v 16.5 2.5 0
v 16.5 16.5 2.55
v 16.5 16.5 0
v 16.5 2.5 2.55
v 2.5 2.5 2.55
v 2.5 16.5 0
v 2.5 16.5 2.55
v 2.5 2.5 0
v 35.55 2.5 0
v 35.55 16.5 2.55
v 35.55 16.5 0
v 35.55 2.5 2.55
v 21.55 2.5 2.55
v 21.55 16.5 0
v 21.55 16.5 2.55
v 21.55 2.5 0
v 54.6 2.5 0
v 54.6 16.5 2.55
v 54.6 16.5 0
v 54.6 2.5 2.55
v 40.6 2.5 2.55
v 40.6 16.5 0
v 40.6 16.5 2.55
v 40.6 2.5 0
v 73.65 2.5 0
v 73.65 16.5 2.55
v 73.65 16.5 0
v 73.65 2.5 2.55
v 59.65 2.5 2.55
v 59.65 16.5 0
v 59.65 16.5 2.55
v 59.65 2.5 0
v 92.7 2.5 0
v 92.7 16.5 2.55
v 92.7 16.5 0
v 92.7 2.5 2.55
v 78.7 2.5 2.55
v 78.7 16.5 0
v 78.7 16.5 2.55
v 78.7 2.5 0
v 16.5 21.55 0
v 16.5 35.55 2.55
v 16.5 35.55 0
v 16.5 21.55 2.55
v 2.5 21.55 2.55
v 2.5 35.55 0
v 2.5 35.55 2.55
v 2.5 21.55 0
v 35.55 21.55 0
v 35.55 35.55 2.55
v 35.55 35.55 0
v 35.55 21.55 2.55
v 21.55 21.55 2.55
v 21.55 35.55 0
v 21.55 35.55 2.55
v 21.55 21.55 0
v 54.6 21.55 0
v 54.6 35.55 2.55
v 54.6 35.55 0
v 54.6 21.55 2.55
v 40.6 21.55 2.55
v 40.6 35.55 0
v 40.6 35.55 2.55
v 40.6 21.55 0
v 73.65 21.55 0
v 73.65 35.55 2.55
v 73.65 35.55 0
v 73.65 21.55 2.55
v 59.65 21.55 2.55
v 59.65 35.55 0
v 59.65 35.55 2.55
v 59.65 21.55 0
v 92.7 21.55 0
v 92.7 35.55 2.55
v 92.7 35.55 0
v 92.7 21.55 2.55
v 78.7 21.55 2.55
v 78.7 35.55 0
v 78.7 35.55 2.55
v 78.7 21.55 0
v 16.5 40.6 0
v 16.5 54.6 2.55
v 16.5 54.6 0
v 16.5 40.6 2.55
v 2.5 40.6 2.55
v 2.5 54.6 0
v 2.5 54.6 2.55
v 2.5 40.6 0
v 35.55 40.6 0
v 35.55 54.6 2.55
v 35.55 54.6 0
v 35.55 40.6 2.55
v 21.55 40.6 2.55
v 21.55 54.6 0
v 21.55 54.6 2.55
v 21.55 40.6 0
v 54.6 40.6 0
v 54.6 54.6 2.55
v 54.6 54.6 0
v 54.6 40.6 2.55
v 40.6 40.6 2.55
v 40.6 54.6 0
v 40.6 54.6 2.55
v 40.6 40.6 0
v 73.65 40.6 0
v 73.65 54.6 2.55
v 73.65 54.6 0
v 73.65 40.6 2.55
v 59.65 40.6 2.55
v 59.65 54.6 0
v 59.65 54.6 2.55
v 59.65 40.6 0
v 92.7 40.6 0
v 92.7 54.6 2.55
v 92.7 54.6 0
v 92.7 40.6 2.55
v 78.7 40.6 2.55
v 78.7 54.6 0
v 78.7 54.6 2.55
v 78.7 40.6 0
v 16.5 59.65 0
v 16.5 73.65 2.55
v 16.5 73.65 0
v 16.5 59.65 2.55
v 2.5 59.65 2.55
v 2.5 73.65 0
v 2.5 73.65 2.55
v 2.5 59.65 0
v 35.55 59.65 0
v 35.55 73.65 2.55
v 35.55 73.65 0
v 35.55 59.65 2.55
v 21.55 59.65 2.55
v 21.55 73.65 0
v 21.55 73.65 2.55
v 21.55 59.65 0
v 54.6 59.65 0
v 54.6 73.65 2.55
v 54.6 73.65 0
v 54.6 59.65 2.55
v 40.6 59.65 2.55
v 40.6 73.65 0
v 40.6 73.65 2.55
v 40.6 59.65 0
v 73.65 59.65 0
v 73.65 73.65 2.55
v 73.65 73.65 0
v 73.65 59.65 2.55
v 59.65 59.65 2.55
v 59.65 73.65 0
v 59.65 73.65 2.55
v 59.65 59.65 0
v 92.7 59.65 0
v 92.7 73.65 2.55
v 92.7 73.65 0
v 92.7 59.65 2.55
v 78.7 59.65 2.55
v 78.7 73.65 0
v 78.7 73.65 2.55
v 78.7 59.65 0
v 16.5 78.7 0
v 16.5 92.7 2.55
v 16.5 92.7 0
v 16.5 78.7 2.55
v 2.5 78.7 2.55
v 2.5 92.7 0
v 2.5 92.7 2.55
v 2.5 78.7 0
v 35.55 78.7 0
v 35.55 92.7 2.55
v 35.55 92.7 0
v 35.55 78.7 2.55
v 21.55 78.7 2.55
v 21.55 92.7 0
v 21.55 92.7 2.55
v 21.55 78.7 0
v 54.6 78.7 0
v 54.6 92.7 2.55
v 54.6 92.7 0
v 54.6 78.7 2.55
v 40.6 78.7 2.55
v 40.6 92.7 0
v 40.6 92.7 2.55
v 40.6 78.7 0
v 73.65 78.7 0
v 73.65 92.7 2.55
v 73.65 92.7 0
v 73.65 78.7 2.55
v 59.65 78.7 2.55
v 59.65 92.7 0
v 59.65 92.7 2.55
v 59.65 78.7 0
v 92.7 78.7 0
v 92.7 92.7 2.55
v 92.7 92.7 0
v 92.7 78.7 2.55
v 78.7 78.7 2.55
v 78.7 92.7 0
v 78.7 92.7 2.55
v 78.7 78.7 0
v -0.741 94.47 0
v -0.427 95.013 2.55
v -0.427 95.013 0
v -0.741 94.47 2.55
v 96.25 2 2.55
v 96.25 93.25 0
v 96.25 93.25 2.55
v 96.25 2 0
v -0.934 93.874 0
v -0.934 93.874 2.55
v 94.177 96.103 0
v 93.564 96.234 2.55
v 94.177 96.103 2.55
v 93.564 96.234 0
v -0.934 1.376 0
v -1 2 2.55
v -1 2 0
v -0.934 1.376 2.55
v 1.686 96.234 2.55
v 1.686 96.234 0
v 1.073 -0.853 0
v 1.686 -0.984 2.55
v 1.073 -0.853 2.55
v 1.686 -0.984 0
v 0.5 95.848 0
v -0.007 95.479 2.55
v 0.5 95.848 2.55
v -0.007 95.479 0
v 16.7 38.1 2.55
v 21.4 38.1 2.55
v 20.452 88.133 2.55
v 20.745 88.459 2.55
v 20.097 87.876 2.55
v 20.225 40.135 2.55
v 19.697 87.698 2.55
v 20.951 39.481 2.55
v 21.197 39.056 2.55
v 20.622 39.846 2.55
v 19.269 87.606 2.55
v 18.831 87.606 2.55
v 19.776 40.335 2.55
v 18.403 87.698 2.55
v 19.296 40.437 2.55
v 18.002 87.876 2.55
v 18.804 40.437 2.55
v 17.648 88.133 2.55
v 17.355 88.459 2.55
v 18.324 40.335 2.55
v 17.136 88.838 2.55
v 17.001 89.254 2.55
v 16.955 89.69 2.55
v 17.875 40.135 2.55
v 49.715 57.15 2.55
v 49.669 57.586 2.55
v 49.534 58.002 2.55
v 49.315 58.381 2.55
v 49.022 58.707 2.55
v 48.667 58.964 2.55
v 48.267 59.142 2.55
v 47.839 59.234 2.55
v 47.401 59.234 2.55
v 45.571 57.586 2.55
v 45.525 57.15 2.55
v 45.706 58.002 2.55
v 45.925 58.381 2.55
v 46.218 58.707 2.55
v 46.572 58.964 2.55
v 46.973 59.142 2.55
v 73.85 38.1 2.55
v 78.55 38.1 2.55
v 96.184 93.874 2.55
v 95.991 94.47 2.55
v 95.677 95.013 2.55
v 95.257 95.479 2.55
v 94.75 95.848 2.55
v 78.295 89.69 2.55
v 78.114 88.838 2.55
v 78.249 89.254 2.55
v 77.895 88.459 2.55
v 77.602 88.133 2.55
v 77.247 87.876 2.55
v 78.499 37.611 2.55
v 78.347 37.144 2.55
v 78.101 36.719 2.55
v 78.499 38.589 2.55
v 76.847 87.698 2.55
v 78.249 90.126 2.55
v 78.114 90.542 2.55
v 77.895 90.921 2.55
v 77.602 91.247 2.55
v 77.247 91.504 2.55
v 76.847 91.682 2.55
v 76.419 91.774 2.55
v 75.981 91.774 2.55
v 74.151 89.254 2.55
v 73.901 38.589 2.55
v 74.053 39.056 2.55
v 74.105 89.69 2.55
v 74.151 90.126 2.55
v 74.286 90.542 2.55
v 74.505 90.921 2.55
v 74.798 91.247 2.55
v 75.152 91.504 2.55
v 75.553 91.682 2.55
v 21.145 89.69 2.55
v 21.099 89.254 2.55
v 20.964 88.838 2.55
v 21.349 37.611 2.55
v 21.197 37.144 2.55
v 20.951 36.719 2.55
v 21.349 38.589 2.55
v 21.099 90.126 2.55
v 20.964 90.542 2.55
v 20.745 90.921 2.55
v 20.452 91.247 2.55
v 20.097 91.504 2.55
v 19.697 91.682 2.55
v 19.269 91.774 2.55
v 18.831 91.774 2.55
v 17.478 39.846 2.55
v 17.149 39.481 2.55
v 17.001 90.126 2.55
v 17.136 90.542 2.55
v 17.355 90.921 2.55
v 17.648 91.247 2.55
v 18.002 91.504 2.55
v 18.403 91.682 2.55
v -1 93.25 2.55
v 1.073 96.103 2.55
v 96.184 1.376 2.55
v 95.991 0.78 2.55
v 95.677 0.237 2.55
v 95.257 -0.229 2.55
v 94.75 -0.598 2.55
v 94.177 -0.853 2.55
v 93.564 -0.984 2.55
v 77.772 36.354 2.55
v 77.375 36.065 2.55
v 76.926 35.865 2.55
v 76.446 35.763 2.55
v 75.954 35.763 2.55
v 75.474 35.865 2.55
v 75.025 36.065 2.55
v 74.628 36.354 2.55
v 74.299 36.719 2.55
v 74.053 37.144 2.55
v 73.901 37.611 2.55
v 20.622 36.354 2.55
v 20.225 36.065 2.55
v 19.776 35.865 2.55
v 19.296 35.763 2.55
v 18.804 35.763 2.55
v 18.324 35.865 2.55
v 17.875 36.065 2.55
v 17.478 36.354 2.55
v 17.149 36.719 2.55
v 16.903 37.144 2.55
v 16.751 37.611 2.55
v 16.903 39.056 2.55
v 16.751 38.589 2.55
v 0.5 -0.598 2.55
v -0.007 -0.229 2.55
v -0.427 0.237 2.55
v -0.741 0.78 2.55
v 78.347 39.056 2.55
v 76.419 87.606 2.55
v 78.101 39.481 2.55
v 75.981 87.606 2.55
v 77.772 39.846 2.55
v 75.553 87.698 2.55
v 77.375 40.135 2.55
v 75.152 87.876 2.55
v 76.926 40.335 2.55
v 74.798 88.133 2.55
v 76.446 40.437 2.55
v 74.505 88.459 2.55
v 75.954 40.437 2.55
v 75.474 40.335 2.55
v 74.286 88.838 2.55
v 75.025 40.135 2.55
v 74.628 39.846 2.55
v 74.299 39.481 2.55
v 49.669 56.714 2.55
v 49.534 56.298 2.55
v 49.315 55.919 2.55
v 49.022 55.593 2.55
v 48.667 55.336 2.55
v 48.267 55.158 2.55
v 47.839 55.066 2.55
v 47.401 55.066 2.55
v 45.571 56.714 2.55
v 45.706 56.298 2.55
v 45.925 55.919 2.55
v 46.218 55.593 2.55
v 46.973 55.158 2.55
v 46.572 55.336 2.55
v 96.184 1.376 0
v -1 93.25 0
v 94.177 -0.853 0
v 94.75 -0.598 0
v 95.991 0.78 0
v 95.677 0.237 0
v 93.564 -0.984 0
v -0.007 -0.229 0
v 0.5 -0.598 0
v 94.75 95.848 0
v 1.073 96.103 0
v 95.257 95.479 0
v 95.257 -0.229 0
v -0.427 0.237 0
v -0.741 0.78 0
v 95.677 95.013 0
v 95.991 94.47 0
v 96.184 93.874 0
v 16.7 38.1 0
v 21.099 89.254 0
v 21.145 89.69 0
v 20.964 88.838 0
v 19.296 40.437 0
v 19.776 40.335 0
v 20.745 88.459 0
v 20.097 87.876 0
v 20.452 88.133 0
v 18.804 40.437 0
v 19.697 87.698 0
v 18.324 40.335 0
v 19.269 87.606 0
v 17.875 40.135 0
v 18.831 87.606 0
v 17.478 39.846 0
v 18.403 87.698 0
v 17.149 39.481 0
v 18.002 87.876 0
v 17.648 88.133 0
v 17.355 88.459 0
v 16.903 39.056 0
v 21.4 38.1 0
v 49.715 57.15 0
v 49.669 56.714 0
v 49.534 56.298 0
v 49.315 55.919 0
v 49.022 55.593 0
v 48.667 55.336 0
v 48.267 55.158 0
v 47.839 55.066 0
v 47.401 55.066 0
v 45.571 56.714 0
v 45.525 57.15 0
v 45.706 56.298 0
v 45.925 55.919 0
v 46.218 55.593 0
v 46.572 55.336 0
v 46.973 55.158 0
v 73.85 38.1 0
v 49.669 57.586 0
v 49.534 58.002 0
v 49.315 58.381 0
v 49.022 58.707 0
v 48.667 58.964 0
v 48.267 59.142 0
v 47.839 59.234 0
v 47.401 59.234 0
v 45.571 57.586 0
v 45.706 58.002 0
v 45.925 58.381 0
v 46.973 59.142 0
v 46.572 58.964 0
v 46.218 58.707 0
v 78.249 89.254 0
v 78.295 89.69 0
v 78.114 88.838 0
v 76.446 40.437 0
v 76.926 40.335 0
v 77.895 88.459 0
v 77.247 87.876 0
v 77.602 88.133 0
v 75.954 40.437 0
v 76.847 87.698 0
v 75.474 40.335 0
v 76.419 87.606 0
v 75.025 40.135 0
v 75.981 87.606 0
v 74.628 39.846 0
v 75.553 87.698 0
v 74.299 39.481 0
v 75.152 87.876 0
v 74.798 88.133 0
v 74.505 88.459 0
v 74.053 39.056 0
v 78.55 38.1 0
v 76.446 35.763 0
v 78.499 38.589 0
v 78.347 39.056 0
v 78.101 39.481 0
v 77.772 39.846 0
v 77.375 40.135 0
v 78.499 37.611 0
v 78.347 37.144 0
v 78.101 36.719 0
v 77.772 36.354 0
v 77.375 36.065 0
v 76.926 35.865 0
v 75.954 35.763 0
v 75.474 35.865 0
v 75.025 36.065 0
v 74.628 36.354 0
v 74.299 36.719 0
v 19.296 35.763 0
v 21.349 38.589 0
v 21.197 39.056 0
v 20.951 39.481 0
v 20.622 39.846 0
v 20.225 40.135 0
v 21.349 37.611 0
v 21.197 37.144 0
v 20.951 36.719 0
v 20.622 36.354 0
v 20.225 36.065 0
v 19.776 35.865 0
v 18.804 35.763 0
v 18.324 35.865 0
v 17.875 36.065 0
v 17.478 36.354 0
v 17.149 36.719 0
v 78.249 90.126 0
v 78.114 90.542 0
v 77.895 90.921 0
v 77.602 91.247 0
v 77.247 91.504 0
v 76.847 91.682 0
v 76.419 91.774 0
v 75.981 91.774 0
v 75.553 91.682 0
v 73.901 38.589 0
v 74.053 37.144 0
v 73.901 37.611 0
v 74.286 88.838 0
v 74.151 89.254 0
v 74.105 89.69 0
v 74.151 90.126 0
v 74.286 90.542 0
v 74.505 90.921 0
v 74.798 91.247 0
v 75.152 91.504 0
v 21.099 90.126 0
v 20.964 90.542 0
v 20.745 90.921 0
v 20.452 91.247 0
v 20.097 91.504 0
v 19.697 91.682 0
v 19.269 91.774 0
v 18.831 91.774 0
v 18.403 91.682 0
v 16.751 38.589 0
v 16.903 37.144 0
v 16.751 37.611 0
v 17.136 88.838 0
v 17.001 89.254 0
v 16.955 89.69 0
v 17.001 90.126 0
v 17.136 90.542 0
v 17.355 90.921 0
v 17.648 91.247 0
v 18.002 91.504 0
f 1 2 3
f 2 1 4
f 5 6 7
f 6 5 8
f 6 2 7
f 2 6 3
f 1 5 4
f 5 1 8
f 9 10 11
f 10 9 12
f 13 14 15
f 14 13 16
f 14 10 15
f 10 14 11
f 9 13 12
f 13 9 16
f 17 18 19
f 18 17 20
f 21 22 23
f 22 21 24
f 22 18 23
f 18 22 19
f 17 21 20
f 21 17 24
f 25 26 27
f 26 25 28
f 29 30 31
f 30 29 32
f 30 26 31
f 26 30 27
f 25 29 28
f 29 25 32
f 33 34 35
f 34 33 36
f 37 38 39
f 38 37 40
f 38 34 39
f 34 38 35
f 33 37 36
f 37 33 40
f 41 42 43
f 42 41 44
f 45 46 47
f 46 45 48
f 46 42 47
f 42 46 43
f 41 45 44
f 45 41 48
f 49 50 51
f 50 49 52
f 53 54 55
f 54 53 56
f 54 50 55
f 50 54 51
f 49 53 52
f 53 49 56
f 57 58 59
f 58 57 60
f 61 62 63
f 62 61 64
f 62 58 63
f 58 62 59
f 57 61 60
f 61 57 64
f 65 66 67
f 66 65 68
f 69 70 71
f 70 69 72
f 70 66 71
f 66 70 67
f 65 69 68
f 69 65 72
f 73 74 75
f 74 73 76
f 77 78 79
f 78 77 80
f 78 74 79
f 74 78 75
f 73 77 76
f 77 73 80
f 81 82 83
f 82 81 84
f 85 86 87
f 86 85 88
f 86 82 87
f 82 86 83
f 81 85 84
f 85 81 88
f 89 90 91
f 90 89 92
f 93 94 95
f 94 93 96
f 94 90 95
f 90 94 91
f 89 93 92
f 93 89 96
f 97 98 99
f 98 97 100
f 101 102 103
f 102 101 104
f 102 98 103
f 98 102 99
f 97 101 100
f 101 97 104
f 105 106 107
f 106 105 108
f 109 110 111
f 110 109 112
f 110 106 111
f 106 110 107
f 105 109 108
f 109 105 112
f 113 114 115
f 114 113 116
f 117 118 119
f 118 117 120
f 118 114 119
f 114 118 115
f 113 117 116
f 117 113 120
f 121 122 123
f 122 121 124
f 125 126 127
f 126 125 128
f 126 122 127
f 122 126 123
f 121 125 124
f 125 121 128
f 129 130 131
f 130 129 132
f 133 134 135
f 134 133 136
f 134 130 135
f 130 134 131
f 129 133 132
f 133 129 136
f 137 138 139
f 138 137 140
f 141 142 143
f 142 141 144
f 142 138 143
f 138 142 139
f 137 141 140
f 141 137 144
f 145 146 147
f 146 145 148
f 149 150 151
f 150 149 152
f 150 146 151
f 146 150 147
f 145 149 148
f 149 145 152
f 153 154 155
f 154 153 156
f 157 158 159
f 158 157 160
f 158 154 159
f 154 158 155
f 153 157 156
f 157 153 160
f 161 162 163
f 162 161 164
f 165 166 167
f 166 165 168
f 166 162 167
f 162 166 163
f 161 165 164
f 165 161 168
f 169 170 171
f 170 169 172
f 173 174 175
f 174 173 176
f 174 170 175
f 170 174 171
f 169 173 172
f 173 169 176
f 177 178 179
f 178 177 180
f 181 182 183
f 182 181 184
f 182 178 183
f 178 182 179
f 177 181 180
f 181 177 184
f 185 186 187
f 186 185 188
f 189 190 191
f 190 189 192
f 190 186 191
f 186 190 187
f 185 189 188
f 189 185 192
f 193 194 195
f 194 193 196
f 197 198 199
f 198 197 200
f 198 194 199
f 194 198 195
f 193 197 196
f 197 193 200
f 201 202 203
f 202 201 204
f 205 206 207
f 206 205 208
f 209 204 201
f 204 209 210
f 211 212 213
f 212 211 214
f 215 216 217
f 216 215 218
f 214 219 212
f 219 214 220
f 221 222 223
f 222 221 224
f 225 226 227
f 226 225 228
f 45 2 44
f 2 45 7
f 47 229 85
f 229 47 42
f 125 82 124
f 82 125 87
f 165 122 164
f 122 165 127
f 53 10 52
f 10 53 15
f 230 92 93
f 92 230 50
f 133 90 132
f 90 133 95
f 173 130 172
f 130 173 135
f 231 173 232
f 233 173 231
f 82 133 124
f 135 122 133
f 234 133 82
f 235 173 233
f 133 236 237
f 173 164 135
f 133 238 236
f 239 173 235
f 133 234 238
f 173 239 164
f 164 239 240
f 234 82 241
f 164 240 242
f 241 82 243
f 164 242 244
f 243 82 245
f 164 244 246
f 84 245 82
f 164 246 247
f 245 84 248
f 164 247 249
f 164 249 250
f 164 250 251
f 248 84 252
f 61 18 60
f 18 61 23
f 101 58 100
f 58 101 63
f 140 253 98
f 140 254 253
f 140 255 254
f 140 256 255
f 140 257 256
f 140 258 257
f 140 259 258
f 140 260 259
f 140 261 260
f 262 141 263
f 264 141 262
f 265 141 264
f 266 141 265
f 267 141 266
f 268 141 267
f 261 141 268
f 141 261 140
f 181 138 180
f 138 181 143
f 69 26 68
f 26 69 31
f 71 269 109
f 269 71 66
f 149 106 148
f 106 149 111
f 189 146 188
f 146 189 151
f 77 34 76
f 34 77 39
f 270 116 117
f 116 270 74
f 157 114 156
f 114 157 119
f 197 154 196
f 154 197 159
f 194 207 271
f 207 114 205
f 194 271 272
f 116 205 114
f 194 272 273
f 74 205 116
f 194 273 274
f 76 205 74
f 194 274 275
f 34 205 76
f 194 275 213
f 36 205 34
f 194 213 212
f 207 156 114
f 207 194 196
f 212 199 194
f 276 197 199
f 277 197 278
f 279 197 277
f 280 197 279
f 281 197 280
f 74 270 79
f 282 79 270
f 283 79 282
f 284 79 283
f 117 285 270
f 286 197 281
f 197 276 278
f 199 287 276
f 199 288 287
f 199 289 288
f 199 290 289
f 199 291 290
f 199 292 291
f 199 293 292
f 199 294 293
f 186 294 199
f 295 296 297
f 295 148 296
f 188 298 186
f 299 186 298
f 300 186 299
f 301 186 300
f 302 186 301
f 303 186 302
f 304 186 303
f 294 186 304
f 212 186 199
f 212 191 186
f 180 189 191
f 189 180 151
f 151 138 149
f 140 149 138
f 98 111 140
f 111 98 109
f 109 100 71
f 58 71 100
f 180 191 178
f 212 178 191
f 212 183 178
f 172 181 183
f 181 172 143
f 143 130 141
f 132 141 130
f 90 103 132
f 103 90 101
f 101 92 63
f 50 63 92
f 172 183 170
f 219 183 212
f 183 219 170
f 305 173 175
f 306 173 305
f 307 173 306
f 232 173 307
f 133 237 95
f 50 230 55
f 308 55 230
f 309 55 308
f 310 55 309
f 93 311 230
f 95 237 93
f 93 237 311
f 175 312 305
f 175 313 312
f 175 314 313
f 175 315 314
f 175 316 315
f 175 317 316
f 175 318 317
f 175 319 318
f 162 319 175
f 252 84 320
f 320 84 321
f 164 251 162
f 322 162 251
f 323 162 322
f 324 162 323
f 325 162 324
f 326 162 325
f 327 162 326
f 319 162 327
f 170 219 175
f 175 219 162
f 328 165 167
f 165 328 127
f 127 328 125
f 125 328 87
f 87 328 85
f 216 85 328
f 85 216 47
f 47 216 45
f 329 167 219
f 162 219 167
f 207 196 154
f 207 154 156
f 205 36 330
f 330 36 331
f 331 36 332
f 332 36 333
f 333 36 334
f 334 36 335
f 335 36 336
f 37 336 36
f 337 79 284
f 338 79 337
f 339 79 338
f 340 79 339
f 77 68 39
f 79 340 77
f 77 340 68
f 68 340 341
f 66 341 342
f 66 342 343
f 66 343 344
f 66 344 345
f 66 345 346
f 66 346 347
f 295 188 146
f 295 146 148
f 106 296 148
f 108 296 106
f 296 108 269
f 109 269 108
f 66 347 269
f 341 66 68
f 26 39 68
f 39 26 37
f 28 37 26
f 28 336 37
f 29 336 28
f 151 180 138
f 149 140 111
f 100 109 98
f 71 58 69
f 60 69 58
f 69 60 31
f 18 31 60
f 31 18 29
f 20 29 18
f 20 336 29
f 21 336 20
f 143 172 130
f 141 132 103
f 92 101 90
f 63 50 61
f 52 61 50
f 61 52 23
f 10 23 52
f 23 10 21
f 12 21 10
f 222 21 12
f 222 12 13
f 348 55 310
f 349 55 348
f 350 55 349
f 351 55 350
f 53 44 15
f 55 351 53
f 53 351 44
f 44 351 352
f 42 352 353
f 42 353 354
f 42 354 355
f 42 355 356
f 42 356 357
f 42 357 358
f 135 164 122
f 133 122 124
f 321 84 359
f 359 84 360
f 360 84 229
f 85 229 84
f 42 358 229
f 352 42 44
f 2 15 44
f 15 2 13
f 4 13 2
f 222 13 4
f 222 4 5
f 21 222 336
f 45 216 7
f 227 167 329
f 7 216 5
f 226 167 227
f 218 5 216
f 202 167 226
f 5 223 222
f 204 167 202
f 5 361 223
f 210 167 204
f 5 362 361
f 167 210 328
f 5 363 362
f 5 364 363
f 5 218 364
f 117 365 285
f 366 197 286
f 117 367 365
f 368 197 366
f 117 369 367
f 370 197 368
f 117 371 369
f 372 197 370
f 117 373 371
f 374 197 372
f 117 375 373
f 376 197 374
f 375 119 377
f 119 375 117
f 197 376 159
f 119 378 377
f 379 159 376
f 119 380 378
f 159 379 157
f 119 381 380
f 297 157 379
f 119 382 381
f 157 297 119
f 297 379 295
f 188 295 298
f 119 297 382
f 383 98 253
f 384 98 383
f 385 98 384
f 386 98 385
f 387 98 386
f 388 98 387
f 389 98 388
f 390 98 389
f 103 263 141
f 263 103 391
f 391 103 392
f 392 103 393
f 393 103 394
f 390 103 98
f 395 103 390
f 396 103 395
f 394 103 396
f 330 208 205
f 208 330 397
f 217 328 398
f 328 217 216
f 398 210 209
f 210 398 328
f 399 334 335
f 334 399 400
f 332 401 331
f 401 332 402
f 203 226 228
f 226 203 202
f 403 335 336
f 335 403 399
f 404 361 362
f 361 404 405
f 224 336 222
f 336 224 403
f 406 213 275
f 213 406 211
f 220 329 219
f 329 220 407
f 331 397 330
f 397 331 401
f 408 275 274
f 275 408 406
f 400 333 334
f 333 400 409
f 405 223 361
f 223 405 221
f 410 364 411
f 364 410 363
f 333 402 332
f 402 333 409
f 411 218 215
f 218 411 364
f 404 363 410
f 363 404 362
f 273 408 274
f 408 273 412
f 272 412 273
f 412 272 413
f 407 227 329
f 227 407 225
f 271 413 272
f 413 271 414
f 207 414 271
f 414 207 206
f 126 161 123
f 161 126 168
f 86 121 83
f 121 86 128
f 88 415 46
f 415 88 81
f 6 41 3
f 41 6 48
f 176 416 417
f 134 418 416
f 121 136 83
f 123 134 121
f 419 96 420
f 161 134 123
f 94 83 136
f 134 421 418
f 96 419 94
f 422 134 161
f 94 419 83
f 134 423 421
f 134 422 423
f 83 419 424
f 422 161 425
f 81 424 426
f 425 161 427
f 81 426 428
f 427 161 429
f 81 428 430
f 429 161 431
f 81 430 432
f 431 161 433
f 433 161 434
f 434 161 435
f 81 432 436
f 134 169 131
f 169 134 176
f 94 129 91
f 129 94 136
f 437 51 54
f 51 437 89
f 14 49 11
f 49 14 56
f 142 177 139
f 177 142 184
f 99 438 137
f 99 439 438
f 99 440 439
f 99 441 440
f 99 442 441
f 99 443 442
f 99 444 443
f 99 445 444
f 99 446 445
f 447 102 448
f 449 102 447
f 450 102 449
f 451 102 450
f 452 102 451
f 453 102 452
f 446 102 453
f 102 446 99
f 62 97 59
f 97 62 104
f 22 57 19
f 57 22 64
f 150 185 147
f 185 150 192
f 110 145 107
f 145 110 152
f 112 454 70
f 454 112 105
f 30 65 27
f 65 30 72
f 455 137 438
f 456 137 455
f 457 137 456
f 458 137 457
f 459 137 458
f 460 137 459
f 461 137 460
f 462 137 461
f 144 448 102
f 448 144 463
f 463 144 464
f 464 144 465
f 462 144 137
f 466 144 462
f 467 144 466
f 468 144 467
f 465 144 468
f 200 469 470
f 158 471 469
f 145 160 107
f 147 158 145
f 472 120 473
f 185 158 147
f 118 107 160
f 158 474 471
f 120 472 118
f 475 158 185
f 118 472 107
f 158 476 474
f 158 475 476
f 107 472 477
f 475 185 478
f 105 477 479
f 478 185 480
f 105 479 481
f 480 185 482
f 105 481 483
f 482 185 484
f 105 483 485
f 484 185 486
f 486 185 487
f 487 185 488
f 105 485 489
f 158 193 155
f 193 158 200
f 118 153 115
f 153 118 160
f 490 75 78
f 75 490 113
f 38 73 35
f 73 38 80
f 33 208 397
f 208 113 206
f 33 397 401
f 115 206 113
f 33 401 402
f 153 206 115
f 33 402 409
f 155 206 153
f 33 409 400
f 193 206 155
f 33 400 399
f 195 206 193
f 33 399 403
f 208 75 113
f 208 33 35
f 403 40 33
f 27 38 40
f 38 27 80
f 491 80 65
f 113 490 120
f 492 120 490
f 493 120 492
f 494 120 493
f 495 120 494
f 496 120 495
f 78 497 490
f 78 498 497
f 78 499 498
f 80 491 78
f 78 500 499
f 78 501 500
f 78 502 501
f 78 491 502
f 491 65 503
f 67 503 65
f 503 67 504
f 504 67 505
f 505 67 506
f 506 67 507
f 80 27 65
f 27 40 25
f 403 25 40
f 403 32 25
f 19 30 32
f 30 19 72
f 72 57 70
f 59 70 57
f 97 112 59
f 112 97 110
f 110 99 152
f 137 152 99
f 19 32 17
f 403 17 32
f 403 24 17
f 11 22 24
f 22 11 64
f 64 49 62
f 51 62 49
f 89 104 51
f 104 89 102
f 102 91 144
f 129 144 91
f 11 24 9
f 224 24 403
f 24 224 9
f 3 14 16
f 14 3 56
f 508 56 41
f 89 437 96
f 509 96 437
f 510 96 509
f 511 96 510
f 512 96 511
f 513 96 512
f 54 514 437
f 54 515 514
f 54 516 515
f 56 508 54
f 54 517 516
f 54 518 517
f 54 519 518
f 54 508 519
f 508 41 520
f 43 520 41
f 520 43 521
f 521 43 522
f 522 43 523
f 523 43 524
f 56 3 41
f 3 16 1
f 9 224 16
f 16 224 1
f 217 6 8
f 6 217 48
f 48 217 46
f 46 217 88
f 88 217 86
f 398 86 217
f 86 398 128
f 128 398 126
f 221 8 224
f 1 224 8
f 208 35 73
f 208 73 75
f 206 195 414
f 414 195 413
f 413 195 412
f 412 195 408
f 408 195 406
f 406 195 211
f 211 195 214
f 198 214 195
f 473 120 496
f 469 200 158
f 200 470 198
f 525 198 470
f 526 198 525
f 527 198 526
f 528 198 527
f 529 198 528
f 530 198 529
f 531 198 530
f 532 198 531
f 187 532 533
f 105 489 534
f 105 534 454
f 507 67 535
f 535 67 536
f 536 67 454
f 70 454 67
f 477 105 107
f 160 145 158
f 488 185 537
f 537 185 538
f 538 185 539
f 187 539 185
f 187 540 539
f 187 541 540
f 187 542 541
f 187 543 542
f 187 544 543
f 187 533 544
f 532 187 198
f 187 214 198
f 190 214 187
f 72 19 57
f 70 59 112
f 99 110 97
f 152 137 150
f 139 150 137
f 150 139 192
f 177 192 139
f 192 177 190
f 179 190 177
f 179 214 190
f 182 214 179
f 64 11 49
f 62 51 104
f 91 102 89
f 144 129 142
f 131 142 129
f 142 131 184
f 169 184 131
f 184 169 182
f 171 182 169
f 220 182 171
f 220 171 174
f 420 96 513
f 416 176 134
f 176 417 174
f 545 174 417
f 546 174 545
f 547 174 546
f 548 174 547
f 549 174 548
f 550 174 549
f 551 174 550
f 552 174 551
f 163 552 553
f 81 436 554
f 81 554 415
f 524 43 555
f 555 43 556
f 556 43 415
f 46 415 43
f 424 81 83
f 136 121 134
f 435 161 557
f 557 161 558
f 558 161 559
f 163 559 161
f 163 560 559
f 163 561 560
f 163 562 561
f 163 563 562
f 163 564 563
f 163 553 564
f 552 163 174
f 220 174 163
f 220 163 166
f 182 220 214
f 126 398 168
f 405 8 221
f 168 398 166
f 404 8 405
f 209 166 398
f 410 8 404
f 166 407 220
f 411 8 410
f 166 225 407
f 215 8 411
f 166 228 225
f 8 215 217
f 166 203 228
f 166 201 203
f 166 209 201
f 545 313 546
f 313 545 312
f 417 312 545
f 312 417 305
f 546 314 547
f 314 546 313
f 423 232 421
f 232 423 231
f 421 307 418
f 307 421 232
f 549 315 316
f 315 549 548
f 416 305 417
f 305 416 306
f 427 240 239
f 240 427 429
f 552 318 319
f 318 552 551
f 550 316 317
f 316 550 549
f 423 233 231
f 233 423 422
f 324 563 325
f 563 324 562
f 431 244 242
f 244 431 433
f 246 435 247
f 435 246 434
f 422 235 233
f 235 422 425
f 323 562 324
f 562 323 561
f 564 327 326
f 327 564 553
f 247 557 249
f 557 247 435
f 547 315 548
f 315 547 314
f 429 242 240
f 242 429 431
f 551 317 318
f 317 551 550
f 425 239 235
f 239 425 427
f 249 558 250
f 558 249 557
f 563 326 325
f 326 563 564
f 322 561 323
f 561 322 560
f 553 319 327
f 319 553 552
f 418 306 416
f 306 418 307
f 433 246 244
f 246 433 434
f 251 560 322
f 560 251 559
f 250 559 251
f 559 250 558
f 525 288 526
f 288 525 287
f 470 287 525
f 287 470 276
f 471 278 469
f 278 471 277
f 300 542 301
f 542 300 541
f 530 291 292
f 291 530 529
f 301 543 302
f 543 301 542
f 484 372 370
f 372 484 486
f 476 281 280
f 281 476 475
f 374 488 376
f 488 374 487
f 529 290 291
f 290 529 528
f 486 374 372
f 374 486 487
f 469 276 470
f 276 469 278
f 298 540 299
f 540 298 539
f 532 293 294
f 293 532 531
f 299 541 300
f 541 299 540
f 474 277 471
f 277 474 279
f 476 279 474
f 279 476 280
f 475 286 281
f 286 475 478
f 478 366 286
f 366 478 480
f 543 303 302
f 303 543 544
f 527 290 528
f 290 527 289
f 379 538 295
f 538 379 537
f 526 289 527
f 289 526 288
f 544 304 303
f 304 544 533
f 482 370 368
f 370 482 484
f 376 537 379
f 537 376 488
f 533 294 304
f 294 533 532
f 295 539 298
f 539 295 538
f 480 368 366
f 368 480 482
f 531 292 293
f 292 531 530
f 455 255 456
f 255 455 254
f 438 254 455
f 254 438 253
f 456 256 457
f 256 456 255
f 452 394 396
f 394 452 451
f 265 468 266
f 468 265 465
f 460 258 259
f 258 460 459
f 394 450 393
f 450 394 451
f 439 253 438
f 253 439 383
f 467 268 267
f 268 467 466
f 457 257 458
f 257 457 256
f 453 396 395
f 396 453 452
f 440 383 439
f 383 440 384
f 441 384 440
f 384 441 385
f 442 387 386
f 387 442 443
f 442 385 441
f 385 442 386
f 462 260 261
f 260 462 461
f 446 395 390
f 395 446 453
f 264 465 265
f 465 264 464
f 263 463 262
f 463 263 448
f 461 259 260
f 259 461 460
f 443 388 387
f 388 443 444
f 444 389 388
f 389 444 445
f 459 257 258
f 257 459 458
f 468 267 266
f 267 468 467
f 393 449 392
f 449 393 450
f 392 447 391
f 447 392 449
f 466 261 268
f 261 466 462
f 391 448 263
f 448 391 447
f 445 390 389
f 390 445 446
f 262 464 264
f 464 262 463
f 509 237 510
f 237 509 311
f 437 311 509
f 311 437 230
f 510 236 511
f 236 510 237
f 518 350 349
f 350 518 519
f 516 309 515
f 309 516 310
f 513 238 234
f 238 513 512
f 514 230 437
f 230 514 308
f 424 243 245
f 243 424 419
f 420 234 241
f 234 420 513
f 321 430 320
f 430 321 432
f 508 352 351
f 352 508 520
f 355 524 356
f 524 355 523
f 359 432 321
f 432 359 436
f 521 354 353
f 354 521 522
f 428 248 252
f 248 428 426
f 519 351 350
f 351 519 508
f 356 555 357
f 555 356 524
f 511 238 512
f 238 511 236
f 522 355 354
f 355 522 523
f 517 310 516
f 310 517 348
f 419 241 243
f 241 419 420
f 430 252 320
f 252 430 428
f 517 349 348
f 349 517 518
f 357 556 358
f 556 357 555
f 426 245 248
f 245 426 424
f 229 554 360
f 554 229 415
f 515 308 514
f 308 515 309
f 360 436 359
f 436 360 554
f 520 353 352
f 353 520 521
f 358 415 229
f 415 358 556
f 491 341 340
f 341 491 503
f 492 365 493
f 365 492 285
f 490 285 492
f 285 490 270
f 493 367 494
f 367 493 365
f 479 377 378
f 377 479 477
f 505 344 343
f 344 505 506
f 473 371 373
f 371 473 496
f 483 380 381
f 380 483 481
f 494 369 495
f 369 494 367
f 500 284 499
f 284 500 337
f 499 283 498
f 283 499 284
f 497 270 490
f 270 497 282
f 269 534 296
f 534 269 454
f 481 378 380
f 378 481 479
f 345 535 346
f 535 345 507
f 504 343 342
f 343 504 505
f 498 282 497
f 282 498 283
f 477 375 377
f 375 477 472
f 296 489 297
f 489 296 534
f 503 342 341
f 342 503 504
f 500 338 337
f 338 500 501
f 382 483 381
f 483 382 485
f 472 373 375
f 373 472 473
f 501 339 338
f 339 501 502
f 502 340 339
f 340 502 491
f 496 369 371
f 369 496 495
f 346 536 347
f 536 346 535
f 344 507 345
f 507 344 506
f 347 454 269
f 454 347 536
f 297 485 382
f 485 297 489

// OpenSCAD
/* 1u Plate */
difference() {
    translate([2,2,0])
    color([0.5,0.5,0.5])  minkowski(){
        cube([91.25,91.25,2.5]);
        cylinder($fn=30,r=3, h=0.05);
    }
    
    /* Screw holes */
    /* Top */
    translate([19.05,89.69,0])
            ScrewHole();
    translate([76.20,89.69,0])
            ScrewHole();
    /* Center */
    translate([47.62,57.15,0])
            ScrewHole();
    /* Bottom */
    translate([19.05,38.10,0])
            ScrewHoleBig();
    translate([76.20,38.10,0])
            ScrewHoleBig();
    
    
    /* Switch cutouts */
    translate([2.5,2.5,-1])
    {
        /* Row 0 */
        translate([0,0,0])
        {
            cube([14,14,8]);
            
            translate([19.05,0,0])
            cube([14,14,8]);
            
            translate([38.1,0,0])
            cube([14,14,8]);
            
            translate([57.15,0,0])
            cube([14,14,8]);
            
            translate([76.2,0,0])
            cube([14,14,8]);
        }
        
        /* Row 1 */
        translate([0,19.05,0])
        {
            cube([14,14,8]);
            
            translate([19.05,0,0])
            cube([14,14,8]);
            
            translate([38.1,0,0])
            cube([14,14,8]);
            
            translate([57.15,0,0])
            cube([14,14,8]);
            
            translate([76.2,0,0])
            cube([14,14,8]);
        }
        
        /* Row 2 */
        translate([0,38.1,0])
        {
            cube([14,14,8]);
            
            translate([19.05,0,0])
            cube([14,14,8]);
            
            translate([38.1,0,0])
            cube([14,14,8]);
            
            translate([57.15,0,0])
            cube([14,14,8]);
            
            translate([76.2,0,0])
            cube([14,14,8]);
        }
        
        /* Row 3 */
        translate([0,57.15,0])
        {
            cube([14,14,8]);
            
            translate([19.05,0,0])
            cube([14,14,8]);
            
            translate([38.1,0,0])
            cube([14,14,8]);
            
            translate([57.15,0,0])
            cube([14,14,8]);
            
            translate([76.2,0,0])
            cube([14,14,8]);
        }
        
        /* Row 4 */
        translate([0,76.2,0])
        {
            cube([14,14,8]);
            
            translate([19.05,0,0])
            cube([14,14,8]);
            
            translate([38.1,0,0])
            cube([14,14,8]);
            
            translate([57.15,0,0])
            cube([14,14,8]);
            
            translate([76.2,0,0])
            cube([14,14,8]);
        }
    }
}

module ScrewHole()
{
    color([1,1,1]) cylinder($fn=30,h=15,d=4.19, center=true);
}
module ScrewHoleBig()
{
    color([1,1,1]) cylinder($fn=30,h=15,d=4.7, center=true);
}
